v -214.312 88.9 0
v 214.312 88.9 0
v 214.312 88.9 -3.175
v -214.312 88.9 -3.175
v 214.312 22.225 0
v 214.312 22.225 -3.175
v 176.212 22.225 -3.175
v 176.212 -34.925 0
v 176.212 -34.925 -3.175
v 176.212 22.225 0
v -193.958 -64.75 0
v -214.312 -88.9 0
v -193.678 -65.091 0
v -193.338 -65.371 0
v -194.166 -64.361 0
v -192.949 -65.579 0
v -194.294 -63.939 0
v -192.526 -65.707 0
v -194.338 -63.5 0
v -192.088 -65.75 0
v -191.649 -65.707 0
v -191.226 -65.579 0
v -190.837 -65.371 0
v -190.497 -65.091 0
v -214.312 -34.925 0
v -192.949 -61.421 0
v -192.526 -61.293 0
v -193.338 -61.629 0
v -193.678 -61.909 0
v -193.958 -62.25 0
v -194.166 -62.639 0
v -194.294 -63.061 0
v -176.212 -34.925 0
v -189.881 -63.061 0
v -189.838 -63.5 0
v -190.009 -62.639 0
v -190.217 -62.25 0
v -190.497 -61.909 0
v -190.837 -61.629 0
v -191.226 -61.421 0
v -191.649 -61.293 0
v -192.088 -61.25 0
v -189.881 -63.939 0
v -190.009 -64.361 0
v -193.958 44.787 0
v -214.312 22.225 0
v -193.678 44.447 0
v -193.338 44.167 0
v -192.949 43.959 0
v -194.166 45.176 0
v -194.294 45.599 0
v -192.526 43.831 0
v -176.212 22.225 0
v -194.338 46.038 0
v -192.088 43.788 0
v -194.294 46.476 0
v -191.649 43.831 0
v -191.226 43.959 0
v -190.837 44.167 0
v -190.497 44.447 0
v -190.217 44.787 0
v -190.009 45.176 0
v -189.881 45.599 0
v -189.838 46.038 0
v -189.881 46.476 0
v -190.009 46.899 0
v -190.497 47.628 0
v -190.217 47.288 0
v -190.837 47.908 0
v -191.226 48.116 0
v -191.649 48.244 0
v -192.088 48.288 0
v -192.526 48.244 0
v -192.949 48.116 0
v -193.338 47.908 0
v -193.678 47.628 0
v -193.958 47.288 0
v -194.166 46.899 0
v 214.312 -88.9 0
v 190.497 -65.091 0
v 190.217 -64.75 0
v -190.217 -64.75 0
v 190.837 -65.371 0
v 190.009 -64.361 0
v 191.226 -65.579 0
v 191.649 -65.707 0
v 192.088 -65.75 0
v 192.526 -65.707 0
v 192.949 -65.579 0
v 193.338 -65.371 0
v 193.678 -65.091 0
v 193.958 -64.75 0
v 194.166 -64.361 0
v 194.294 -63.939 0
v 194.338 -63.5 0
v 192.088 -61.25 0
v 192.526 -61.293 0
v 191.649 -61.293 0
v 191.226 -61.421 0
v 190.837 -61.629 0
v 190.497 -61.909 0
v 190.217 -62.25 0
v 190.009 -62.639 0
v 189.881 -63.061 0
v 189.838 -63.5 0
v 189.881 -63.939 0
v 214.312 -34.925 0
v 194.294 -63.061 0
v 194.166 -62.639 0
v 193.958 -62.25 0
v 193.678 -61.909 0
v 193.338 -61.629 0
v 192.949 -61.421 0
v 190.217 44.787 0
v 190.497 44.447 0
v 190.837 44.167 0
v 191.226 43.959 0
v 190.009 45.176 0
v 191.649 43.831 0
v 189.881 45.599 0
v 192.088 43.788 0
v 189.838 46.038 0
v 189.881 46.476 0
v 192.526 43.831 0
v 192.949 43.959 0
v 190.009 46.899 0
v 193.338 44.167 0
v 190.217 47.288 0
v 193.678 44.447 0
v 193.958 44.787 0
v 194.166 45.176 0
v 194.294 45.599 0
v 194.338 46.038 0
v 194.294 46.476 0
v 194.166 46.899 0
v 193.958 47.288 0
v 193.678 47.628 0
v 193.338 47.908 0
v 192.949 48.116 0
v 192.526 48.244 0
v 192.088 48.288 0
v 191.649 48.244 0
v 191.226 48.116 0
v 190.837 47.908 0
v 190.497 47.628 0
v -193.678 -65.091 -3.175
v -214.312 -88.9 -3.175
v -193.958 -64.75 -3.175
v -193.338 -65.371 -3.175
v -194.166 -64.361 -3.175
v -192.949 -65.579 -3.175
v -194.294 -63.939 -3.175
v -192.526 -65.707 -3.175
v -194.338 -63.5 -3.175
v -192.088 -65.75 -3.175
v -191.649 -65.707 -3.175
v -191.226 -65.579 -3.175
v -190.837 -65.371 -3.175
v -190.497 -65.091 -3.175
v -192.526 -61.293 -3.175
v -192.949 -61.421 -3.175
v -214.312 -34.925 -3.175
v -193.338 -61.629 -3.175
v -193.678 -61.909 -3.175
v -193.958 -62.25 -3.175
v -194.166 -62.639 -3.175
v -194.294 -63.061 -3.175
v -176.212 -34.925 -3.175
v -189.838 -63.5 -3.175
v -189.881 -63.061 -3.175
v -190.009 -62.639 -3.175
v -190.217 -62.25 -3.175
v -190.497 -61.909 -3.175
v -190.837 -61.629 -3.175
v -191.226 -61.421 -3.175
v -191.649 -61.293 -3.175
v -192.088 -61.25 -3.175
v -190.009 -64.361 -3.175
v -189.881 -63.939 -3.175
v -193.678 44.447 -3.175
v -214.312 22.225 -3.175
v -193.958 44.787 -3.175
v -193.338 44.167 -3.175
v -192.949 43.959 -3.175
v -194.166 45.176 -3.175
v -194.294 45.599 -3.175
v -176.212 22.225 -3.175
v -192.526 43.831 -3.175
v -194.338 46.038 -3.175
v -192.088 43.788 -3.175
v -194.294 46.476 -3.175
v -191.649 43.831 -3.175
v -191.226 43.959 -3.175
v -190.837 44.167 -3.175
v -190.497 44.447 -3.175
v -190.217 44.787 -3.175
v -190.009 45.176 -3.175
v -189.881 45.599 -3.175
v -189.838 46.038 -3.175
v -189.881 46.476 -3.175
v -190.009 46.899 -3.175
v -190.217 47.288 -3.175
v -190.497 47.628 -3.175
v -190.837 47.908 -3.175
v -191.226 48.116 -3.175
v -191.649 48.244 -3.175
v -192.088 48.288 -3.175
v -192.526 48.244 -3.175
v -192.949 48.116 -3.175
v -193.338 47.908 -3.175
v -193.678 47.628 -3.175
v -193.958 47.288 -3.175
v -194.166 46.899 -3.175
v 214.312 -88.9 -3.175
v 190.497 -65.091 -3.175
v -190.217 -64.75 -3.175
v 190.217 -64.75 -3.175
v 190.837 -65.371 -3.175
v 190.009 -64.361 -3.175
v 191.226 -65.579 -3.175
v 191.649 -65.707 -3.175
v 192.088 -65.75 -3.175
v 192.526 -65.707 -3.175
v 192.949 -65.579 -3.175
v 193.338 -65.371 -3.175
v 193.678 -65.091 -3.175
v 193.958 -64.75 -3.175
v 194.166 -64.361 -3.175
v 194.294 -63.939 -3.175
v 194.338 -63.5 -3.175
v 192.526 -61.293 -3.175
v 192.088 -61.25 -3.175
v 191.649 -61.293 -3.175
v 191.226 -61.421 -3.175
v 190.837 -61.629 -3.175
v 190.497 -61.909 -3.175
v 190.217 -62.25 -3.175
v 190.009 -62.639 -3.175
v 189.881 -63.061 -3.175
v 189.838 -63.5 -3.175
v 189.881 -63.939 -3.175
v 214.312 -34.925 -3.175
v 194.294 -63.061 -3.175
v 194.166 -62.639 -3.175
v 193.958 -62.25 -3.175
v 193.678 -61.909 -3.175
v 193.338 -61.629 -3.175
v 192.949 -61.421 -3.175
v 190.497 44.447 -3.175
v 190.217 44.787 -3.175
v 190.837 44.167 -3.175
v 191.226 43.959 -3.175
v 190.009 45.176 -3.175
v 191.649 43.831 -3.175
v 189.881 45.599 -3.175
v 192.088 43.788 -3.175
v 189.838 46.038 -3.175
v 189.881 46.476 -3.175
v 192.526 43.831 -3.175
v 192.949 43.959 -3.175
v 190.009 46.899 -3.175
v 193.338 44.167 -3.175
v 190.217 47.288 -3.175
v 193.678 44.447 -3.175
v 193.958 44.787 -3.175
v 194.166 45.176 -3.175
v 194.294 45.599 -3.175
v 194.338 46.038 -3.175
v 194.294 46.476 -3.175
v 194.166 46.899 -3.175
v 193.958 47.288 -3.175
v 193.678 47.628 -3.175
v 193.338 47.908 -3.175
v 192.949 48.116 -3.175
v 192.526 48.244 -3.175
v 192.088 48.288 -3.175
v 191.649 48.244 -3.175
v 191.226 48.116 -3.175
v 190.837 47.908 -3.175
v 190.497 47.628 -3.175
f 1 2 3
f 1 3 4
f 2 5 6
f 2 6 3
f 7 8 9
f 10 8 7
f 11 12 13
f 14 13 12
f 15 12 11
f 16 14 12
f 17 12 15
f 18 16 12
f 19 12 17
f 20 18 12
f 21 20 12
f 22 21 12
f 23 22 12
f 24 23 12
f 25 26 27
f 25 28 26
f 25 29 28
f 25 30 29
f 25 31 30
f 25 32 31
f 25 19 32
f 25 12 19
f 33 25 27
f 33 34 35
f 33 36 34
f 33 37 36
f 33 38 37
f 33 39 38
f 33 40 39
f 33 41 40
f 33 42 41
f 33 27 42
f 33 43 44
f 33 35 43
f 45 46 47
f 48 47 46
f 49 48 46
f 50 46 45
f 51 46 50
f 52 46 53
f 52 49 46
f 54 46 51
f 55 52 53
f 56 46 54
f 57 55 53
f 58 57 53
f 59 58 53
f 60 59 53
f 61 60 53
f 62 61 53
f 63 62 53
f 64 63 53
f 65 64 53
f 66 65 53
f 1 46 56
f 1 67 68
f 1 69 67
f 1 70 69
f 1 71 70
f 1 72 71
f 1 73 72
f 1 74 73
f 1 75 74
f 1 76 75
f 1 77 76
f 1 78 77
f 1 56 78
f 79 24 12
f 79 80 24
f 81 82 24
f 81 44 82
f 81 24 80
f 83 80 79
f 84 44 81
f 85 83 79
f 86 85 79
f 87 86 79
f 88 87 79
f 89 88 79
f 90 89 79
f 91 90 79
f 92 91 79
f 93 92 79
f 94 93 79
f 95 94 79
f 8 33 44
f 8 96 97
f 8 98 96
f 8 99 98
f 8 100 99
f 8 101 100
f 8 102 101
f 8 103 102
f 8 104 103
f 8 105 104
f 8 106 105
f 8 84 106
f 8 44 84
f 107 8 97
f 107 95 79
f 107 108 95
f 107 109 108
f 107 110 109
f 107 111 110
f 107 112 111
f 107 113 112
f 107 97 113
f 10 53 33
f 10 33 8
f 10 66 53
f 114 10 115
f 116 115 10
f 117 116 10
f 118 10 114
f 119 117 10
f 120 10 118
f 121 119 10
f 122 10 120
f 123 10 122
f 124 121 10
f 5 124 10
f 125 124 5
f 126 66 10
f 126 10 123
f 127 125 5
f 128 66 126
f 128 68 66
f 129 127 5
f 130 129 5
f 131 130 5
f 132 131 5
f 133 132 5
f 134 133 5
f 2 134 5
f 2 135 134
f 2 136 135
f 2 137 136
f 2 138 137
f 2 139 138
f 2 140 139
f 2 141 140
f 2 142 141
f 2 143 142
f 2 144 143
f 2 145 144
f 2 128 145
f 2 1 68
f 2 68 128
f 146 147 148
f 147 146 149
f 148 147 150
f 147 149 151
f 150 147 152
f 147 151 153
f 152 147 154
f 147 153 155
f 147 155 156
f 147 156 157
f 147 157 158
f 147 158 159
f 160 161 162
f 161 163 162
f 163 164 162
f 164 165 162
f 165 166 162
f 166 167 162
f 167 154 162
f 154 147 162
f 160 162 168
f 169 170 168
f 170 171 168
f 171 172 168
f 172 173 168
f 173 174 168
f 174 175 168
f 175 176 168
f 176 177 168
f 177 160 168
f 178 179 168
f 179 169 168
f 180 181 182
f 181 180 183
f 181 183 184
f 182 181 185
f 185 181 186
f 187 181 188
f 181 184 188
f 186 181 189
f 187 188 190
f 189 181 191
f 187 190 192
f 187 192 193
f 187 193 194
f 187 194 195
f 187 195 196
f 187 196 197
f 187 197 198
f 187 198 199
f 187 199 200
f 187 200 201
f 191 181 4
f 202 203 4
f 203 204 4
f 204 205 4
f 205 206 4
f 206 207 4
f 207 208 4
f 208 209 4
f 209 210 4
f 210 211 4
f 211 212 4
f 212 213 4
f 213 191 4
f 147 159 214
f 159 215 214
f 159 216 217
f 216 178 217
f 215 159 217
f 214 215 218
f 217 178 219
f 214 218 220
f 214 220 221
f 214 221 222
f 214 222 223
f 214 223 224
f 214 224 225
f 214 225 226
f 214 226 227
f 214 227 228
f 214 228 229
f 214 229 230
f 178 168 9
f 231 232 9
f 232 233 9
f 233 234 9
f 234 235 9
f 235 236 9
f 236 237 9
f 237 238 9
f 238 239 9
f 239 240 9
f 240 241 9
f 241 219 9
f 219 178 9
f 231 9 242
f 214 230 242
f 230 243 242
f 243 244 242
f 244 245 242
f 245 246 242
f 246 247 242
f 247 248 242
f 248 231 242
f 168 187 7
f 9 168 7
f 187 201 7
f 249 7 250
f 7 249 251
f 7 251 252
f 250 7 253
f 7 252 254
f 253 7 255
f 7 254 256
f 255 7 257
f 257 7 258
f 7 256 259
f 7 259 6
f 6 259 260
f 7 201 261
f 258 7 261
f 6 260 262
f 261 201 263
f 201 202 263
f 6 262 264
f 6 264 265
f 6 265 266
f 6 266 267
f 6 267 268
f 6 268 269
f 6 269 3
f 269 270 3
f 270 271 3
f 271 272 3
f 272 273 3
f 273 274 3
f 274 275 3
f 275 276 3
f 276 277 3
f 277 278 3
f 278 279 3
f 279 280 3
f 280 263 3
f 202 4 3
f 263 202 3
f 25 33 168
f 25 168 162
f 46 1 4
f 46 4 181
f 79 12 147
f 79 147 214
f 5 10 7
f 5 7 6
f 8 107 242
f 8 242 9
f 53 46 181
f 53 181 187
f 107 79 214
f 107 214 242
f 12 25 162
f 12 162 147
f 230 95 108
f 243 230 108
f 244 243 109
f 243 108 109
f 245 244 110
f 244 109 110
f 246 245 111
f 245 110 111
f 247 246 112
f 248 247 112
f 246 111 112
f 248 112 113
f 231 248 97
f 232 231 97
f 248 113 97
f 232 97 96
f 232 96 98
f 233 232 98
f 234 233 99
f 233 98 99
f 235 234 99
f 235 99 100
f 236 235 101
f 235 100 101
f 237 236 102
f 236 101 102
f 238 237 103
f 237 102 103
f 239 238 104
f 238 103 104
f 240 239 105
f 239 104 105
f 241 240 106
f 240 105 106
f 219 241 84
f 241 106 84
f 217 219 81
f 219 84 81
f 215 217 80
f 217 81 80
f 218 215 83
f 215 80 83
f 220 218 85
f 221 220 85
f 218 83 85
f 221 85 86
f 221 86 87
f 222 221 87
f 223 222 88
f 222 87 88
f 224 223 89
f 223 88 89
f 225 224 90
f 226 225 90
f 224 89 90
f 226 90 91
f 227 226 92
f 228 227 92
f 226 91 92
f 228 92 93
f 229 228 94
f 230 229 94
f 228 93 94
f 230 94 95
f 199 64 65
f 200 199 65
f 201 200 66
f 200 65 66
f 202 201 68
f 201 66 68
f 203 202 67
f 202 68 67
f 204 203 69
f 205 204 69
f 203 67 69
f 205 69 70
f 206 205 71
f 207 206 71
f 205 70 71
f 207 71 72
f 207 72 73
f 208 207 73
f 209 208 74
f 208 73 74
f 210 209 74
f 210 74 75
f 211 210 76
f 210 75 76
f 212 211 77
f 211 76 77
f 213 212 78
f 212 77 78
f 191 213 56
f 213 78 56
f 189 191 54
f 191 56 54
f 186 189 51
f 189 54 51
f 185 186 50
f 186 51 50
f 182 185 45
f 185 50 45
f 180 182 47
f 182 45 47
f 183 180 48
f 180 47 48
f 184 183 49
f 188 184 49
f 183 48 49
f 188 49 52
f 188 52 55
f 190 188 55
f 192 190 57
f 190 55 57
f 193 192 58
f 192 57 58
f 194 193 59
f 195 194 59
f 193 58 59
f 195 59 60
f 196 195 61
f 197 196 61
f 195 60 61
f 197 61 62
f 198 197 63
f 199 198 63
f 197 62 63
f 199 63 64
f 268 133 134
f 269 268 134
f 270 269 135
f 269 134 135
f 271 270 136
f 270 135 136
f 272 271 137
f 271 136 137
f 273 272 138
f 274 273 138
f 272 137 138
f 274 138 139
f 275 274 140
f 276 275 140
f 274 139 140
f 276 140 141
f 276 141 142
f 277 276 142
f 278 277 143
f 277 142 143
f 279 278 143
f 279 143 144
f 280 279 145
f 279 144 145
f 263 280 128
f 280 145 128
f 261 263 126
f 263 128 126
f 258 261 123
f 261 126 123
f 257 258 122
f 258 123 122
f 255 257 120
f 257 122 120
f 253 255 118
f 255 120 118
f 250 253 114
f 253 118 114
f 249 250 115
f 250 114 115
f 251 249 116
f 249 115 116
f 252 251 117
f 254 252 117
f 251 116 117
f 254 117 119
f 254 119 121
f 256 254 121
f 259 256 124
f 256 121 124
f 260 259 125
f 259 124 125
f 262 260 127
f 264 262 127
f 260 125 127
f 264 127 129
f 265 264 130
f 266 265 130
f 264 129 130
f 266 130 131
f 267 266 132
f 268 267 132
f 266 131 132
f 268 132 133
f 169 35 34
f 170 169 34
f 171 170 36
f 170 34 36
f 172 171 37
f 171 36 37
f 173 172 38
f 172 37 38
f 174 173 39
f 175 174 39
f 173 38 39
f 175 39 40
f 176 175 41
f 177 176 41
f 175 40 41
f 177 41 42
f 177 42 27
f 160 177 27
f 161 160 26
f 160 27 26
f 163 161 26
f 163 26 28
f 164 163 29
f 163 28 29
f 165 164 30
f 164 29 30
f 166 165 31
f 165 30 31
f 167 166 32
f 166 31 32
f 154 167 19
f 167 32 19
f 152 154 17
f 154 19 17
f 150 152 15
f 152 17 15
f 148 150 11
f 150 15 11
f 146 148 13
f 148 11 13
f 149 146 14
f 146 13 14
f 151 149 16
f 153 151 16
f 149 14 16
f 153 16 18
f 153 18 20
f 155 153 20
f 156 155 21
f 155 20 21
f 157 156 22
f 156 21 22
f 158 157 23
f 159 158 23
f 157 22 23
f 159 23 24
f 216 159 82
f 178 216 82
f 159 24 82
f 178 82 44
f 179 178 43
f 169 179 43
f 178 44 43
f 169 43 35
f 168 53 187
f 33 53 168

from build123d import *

# Parameters (mm, degrees)
SKETCH1_R           = 2.25
BOSS_EXTRUDE1_DEPTH = 3.175


with BuildPart() as part:
    # Sketch1 → Boss-Extrude1 (new body)
    with BuildSketch(Plane.XY):
        Polygon((-214.3125, -34.925), (-214.3125, -88.9), (214.3125, -88.9), (214.3125, -34.925), (176.2125, -34.925), (176.2125, 22.225), (214.3125, 22.225), (214.3125, 88.9), (-214.3125, 88.9), (-214.3125, 22.225), (-176.2125, 22.225), (-176.2125, -34.925), align=None)
        with Locations((-192.0875, -63.5)):
            Circle(SKETCH1_R, mode=Mode.SUBTRACT)
        with Locations((192.0875, -63.5)):
            Circle(SKETCH1_R, mode=Mode.SUBTRACT)
        with Locations((-192.0875, 46.0375)):
            Circle(SKETCH1_R, mode=Mode.SUBTRACT)
        with Locations((192.0875, 46.0375)):
            Circle(SKETCH1_R, mode=Mode.SUBTRACT)
    extrude(amount=-BOSS_EXTRUDE1_DEPTH)


solid = part.part
